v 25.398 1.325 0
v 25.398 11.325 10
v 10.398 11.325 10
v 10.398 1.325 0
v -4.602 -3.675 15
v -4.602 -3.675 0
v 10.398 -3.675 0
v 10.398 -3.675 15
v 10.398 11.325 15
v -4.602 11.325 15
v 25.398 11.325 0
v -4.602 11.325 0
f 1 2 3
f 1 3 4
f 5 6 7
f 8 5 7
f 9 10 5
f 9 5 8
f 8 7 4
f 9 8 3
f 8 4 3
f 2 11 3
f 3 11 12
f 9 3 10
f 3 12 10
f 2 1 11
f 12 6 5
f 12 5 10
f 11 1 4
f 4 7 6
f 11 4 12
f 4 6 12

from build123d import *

# Parameters (mm, degrees)
F0_W     = 15
F0_H     = 15
F1_DEPTH = 15
F3_DEPTH = 15


with BuildPart() as f1:
    # F0 (on Top) → F1 (new body)
    with BuildSketch(Plane.XY):
        with Locations((2.898159, 3.825012)):
            Rectangle(F0_W, F0_H)
    extrude(amount=F1_DEPTH)

    # F2 (on face) → F3 (join)
    with BuildSketch(Plane.YZ.offset(10.398159)):
        Polygon((11.325012, 10), (1.325012, 0), (11.325012, 0), align=None)
    extrude(amount=F3_DEPTH)


solid = f1.part
